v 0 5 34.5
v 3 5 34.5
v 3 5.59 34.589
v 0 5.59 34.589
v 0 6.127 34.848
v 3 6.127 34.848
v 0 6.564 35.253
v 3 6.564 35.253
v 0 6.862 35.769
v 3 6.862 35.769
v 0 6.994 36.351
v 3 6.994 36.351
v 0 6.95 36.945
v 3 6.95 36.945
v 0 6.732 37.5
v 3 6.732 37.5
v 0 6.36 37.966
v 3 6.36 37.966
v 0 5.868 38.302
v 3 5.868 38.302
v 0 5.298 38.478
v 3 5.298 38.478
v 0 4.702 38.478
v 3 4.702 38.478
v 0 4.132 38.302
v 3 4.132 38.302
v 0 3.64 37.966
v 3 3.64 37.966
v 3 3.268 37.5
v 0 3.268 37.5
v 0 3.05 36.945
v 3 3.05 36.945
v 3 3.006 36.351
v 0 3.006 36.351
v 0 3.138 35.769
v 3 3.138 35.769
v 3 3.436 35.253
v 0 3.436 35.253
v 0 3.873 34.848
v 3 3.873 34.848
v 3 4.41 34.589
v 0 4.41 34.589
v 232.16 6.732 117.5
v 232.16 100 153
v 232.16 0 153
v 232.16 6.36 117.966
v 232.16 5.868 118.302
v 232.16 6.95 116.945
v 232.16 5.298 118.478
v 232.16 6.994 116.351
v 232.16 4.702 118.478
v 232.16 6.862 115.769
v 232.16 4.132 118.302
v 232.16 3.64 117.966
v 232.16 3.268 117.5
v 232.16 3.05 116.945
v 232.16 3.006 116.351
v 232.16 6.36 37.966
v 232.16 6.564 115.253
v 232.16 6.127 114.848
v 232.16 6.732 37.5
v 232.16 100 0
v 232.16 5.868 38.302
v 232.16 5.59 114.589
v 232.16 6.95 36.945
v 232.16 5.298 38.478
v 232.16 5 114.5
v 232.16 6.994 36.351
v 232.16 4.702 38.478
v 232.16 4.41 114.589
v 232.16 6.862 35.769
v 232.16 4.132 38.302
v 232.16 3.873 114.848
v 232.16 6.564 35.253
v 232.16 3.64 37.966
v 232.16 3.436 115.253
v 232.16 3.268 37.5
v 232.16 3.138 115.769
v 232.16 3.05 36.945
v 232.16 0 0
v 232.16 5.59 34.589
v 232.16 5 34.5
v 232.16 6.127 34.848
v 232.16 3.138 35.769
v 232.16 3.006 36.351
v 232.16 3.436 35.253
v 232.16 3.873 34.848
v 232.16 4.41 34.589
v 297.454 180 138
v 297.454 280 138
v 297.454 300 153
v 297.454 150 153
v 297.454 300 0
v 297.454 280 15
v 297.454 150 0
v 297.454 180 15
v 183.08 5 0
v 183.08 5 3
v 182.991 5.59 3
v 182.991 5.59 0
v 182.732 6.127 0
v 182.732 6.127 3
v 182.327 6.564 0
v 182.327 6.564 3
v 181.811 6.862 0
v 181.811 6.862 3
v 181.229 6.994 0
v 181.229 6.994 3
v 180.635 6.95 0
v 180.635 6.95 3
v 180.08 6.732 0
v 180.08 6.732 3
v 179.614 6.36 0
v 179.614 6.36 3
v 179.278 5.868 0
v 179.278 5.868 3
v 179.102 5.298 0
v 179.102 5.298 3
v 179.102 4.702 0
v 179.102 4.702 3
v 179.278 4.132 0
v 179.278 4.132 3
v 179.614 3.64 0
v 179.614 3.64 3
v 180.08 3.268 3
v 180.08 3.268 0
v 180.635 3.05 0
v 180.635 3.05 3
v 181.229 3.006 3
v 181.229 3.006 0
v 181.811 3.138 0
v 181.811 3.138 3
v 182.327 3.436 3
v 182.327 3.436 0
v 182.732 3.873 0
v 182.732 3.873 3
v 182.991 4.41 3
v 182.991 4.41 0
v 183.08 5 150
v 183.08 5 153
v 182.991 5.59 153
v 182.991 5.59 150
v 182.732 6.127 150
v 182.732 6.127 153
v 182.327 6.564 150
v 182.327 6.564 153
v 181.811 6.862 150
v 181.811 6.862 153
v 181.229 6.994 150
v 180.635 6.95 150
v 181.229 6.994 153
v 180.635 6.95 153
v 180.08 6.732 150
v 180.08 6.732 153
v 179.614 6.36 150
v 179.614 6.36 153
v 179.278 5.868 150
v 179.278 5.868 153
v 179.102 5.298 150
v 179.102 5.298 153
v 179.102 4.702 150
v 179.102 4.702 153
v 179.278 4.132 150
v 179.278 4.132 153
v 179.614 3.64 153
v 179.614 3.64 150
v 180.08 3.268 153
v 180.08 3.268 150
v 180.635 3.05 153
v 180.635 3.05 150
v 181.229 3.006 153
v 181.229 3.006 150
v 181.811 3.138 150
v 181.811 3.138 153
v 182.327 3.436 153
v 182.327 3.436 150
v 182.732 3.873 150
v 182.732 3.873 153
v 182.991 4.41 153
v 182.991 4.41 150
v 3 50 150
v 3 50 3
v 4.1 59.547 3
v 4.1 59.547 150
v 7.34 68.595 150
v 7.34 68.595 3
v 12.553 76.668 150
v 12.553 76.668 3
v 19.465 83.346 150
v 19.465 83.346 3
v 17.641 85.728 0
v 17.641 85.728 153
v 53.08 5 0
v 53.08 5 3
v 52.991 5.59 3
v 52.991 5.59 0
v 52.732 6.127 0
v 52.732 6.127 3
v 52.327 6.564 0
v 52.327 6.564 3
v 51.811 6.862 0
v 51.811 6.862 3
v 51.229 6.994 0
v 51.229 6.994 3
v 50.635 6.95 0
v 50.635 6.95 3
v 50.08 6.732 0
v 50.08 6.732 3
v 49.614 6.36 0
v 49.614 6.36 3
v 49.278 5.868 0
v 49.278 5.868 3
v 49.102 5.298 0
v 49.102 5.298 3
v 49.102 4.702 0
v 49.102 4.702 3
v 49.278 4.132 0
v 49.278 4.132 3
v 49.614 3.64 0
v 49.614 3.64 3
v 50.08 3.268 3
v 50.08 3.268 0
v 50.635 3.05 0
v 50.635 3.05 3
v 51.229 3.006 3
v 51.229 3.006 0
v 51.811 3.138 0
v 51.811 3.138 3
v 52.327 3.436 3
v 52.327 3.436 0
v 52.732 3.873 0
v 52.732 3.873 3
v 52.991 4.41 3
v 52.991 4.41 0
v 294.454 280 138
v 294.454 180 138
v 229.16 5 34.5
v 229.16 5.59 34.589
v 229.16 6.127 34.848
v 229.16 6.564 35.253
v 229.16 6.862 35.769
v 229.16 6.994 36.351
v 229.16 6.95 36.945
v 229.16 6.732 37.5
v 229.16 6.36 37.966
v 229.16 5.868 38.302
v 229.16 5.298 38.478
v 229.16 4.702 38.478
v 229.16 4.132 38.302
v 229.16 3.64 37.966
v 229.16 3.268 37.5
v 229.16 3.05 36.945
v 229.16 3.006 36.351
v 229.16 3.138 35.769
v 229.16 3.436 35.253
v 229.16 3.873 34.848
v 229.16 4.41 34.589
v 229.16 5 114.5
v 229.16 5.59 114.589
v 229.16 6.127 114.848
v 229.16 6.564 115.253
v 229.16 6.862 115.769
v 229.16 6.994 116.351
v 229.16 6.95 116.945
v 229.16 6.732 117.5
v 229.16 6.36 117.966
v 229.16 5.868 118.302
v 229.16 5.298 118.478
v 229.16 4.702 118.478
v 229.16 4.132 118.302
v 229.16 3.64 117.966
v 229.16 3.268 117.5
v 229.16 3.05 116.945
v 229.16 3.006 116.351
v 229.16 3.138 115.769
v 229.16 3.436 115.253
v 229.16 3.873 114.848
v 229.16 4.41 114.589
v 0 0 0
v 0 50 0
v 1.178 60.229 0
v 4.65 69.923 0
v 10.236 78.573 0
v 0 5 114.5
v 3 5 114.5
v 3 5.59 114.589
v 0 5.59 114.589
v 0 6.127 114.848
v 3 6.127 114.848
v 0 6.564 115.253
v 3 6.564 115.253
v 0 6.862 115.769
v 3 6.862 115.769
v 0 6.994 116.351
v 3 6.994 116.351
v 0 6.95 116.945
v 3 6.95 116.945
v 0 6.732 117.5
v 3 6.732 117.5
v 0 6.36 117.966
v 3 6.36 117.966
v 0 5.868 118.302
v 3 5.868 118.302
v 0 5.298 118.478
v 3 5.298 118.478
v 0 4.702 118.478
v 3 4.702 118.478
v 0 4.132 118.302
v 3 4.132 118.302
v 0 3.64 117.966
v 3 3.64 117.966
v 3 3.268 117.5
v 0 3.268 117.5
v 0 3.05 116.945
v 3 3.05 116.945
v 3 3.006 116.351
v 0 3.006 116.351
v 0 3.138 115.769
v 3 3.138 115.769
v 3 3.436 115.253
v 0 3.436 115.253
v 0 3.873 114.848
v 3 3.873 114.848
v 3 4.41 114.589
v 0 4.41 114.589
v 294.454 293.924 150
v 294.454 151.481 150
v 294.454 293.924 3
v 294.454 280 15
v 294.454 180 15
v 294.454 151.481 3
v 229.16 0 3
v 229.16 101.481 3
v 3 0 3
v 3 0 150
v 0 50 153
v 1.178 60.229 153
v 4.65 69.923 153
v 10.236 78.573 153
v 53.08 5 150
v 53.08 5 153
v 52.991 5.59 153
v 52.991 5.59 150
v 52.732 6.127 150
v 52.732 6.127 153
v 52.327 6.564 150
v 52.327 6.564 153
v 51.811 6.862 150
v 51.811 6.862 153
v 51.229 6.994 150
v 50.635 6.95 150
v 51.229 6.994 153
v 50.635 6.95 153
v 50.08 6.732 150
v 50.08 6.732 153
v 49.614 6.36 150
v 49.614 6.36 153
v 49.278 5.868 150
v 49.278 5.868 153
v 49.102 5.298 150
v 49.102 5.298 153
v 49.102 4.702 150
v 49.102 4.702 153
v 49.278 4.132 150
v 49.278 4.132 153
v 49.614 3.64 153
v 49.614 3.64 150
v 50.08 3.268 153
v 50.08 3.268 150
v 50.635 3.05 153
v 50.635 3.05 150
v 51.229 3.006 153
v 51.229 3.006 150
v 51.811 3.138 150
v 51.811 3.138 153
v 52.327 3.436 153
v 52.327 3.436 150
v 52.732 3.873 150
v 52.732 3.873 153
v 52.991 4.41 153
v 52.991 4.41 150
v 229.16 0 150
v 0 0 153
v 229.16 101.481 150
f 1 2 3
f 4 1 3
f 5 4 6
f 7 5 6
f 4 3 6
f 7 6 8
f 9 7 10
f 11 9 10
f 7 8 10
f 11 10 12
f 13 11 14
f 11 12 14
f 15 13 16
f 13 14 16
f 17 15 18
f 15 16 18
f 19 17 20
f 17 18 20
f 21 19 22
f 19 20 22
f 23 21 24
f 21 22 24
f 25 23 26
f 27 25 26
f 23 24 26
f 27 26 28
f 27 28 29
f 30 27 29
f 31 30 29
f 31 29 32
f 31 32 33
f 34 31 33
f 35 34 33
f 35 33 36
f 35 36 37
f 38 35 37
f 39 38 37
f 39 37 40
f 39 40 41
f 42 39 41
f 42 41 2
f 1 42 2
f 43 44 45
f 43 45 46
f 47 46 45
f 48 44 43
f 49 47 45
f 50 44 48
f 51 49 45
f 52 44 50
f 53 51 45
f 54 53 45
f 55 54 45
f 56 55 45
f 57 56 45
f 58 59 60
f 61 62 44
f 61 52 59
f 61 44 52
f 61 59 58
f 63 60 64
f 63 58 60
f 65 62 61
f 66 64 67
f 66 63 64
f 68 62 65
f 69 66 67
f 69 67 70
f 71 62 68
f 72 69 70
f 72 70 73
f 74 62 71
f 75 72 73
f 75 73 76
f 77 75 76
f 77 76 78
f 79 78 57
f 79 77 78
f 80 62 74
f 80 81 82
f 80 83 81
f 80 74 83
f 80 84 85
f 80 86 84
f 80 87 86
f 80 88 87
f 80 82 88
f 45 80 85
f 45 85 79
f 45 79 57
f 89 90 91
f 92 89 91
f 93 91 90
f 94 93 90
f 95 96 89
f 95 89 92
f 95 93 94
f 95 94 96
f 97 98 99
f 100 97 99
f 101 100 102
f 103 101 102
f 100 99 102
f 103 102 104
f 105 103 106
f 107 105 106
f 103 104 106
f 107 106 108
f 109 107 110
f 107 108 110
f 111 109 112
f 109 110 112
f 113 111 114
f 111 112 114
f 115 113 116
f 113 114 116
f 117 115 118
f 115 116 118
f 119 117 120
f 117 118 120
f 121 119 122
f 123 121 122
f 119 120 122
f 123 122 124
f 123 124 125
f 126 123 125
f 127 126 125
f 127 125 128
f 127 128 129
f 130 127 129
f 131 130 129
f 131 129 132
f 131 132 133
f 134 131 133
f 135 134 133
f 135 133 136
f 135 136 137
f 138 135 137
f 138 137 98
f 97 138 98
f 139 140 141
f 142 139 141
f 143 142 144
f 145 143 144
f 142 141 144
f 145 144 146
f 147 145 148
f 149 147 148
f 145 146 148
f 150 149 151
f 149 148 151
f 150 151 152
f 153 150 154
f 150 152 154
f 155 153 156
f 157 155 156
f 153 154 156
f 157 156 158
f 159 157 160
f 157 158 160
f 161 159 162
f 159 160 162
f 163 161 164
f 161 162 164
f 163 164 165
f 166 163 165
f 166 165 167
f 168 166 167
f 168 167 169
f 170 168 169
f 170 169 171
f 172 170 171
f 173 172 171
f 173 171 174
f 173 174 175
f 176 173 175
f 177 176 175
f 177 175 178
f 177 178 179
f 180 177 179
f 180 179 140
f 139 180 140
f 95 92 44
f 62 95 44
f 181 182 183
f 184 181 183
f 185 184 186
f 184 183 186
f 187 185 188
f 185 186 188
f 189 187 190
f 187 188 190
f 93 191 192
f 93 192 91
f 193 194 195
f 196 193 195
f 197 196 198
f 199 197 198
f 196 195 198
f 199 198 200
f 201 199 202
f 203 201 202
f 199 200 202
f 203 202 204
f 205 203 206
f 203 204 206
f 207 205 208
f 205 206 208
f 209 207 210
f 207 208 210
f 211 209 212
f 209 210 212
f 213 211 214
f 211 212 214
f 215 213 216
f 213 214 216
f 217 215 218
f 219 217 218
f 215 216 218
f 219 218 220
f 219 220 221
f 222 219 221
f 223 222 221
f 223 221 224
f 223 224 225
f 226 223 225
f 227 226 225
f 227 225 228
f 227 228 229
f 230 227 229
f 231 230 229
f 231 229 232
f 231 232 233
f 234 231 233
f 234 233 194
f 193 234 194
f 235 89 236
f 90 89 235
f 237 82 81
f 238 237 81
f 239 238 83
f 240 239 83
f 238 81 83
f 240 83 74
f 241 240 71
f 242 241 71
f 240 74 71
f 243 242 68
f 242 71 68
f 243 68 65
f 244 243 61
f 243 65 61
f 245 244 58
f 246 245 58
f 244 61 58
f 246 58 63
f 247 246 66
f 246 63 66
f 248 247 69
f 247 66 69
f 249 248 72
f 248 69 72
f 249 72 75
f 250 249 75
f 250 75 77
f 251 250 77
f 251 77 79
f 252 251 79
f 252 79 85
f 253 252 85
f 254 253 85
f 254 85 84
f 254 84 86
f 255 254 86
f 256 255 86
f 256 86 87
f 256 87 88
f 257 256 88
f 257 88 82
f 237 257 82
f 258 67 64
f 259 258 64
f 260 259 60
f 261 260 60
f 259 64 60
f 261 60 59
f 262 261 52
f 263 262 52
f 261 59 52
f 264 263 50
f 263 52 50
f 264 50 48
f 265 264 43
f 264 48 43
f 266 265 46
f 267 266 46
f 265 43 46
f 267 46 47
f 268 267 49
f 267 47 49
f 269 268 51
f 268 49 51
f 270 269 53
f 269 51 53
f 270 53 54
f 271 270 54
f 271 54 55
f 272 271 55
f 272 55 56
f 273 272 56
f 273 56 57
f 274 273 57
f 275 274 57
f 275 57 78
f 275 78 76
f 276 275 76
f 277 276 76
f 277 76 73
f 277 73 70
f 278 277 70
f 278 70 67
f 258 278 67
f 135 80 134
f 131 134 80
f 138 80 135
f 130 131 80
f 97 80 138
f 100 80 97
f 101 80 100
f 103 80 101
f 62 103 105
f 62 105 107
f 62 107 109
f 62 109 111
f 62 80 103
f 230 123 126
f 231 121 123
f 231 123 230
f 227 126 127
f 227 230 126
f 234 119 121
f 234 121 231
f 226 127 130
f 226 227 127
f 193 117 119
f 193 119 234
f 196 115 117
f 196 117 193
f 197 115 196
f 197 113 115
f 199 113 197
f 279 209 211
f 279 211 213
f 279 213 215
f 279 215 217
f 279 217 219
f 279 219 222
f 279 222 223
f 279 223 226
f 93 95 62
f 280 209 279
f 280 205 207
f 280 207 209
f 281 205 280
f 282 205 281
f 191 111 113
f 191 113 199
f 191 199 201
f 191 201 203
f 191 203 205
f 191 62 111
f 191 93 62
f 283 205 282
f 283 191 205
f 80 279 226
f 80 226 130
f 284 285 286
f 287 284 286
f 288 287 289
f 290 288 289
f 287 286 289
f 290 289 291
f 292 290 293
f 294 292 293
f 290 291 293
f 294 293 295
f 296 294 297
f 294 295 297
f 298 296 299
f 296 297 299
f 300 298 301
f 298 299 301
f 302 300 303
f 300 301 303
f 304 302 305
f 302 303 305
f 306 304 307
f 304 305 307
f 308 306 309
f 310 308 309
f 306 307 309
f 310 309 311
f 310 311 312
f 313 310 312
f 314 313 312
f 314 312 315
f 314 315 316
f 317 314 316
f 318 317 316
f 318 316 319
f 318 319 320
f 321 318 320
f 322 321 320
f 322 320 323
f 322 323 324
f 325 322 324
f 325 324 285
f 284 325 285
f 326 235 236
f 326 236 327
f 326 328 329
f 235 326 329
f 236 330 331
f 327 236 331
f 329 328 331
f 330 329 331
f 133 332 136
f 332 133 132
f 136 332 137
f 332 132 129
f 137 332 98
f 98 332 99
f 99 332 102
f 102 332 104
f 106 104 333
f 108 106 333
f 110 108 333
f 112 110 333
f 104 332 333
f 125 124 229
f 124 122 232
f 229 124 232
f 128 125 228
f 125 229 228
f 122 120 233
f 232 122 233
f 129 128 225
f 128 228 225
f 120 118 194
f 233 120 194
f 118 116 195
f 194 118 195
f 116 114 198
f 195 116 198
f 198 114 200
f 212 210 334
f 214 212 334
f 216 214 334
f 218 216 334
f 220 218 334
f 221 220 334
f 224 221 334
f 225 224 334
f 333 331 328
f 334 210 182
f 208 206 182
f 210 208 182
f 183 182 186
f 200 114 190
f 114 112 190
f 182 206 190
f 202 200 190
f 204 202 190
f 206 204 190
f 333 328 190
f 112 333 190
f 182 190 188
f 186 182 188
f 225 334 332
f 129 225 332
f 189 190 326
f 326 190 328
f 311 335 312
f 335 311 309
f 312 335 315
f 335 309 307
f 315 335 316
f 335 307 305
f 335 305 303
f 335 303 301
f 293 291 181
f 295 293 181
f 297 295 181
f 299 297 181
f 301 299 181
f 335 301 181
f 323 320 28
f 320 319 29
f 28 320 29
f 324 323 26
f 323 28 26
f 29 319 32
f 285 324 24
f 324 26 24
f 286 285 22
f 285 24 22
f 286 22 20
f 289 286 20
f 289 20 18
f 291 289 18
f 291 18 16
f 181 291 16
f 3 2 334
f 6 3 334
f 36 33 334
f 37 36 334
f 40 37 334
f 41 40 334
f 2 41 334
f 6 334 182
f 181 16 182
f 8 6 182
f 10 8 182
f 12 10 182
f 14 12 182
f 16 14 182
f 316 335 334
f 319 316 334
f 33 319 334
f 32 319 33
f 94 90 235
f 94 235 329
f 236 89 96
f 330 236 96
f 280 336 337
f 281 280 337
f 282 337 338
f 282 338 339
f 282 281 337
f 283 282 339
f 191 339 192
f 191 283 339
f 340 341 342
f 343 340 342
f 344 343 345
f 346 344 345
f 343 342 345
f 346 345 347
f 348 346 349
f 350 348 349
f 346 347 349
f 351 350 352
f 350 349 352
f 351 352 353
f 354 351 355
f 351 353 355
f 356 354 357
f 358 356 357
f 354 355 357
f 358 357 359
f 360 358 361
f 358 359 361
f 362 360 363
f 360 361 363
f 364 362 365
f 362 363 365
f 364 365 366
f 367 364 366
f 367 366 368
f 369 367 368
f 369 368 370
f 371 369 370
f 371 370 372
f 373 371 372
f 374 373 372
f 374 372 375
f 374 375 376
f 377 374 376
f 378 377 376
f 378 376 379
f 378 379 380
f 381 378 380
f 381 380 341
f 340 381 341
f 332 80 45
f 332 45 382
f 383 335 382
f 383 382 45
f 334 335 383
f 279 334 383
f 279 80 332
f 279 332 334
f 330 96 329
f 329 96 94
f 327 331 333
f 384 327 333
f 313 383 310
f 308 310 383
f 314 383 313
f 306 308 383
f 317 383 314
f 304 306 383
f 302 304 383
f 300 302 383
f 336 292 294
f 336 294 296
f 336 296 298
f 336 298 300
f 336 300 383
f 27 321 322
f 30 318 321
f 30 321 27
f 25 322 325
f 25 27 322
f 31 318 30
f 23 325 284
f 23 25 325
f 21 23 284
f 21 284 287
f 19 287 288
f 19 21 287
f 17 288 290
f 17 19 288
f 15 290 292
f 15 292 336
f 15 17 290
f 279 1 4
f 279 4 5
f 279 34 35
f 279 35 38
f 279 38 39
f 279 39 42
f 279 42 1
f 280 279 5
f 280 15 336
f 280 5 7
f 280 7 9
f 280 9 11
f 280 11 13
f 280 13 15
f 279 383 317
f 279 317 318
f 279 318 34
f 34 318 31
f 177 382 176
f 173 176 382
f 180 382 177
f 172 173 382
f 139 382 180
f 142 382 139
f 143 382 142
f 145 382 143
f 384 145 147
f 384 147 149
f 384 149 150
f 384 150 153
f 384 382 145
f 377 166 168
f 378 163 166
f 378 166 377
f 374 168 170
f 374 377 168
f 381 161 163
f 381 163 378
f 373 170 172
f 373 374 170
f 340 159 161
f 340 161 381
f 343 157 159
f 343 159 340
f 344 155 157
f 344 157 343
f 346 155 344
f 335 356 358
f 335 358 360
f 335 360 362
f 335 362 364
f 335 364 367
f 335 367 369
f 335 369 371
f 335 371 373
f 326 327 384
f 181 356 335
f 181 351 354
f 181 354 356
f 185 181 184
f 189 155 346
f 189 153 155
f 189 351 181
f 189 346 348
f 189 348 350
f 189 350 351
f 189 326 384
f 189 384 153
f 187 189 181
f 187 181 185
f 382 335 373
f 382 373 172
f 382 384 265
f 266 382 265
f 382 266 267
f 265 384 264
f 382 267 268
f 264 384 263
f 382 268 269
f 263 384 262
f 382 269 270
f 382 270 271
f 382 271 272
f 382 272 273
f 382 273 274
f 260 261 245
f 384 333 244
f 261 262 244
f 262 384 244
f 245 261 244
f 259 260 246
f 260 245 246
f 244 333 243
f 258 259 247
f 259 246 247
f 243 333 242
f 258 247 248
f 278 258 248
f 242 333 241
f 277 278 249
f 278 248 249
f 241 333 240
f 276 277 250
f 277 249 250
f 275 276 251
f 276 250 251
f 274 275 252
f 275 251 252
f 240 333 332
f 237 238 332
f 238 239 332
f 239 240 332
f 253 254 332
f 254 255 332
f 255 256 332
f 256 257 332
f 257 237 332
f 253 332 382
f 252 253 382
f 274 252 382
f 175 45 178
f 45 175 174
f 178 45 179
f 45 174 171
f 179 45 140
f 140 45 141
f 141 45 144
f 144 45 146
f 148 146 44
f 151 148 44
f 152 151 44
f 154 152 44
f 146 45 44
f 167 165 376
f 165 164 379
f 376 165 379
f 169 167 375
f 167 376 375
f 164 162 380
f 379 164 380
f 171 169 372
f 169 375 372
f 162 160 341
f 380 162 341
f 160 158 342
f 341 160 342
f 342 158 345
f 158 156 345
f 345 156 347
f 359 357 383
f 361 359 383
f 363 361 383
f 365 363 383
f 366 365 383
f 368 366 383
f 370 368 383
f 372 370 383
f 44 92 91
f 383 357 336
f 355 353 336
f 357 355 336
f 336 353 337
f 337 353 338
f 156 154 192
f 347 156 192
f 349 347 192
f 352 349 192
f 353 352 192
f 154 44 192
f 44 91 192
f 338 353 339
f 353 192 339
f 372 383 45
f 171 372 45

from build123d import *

# Parameters (mm, degrees)
RESSALTO_EXTRUS_O1_DEPTH = 153
CASCA1_T                 = -3
CORTE_EXTRUS_O1_REACH    = 299.454
ESBO_O4_W                = 123
ESBO_O4_H                = 100
ESBO_O5_R                = 2
CORTE_EXTRUS_O2_DEPTH    = 154
ESBO_O6_R                = 2
CORTE_EXTRUS_O3_DEPTH    = 233.16


with BuildPart() as part:
    # Esboço1 → Ressalto-extrusão1 (new body)
    with BuildSketch(Plane.XY):
        with BuildLine():
            Line((0, 0), (0, 50))
            ThreePointArc((0, 50), (4.650495405, 69.922787932), (17.640776843, 85.72776103))
            Line((17.640776843, 85.72776103), (297.45381486, 300))
            Line((297.45381486, 300), (297.45381486, 150))
            Line((297.45381486, 150), (232.16, 100))
            Line((232.16, 100), (232.16, 0))
            Line((232.16, 0), (0, 0))
        make_face()
    extrude(amount=RESSALTO_EXTRUS_O1_DEPTH)

    # Casca1
    casca1_openings = [part.faces().sort_by_distance(p)[0] for p in [
        (116.08, 0, 76.5),
    ]]
    offset(amount=CASCA1_T, openings=casca1_openings, kind=Kind.INTERSECTION)

    # Esboço4 → Corte-extrusão1 (cut, up to next)
    with BuildSketch(Plane(origin=(297.45381486, 0, 0), x_dir=(0, 0, -1), z_dir=(1, 0, 0)), mode=Mode.PRIVATE) as corte_extrus_o1_sk1:
        with Locations((-76.5, 230)):
            Rectangle(ESBO_O4_W, ESBO_O4_H)
    corte_extrus_o1_tool1 = extrude(corte_extrus_o1_sk1.sketch, amount=-CORTE_EXTRUS_O1_REACH, mode=Mode.PRIVATE) & part.part
    add(corte_extrus_o1_tool1.solids().sort_by_distance((297.453815, 230, 76.5))[0], mode=Mode.SUBTRACT)

    # Esboço5 → Corte-extrusão2 (cut, through all)
    with BuildSketch(Plane.XY.offset(153)):
        with Locations((181.08, 5)):
            Circle(ESBO_O5_R)
        with Locations((51.08, 5)):
            Circle(ESBO_O5_R)
    extrude(amount=-CORTE_EXTRUS_O2_DEPTH, mode=Mode.SUBTRACT)

    # Esboço6 → Corte-extrusão3 (cut, through all)
    with BuildSketch(Plane(origin=(232.16, 0, 0), x_dir=(0, 0, -1), z_dir=(1, 0, 0))):
        with Locations((-36.5, 5)):
            Circle(ESBO_O6_R)
        with Locations((-116.5, 5)):
            Circle(ESBO_O6_R)
    extrude(amount=-CORTE_EXTRUS_O3_DEPTH, mode=Mode.SUBTRACT)


solid = part.part
